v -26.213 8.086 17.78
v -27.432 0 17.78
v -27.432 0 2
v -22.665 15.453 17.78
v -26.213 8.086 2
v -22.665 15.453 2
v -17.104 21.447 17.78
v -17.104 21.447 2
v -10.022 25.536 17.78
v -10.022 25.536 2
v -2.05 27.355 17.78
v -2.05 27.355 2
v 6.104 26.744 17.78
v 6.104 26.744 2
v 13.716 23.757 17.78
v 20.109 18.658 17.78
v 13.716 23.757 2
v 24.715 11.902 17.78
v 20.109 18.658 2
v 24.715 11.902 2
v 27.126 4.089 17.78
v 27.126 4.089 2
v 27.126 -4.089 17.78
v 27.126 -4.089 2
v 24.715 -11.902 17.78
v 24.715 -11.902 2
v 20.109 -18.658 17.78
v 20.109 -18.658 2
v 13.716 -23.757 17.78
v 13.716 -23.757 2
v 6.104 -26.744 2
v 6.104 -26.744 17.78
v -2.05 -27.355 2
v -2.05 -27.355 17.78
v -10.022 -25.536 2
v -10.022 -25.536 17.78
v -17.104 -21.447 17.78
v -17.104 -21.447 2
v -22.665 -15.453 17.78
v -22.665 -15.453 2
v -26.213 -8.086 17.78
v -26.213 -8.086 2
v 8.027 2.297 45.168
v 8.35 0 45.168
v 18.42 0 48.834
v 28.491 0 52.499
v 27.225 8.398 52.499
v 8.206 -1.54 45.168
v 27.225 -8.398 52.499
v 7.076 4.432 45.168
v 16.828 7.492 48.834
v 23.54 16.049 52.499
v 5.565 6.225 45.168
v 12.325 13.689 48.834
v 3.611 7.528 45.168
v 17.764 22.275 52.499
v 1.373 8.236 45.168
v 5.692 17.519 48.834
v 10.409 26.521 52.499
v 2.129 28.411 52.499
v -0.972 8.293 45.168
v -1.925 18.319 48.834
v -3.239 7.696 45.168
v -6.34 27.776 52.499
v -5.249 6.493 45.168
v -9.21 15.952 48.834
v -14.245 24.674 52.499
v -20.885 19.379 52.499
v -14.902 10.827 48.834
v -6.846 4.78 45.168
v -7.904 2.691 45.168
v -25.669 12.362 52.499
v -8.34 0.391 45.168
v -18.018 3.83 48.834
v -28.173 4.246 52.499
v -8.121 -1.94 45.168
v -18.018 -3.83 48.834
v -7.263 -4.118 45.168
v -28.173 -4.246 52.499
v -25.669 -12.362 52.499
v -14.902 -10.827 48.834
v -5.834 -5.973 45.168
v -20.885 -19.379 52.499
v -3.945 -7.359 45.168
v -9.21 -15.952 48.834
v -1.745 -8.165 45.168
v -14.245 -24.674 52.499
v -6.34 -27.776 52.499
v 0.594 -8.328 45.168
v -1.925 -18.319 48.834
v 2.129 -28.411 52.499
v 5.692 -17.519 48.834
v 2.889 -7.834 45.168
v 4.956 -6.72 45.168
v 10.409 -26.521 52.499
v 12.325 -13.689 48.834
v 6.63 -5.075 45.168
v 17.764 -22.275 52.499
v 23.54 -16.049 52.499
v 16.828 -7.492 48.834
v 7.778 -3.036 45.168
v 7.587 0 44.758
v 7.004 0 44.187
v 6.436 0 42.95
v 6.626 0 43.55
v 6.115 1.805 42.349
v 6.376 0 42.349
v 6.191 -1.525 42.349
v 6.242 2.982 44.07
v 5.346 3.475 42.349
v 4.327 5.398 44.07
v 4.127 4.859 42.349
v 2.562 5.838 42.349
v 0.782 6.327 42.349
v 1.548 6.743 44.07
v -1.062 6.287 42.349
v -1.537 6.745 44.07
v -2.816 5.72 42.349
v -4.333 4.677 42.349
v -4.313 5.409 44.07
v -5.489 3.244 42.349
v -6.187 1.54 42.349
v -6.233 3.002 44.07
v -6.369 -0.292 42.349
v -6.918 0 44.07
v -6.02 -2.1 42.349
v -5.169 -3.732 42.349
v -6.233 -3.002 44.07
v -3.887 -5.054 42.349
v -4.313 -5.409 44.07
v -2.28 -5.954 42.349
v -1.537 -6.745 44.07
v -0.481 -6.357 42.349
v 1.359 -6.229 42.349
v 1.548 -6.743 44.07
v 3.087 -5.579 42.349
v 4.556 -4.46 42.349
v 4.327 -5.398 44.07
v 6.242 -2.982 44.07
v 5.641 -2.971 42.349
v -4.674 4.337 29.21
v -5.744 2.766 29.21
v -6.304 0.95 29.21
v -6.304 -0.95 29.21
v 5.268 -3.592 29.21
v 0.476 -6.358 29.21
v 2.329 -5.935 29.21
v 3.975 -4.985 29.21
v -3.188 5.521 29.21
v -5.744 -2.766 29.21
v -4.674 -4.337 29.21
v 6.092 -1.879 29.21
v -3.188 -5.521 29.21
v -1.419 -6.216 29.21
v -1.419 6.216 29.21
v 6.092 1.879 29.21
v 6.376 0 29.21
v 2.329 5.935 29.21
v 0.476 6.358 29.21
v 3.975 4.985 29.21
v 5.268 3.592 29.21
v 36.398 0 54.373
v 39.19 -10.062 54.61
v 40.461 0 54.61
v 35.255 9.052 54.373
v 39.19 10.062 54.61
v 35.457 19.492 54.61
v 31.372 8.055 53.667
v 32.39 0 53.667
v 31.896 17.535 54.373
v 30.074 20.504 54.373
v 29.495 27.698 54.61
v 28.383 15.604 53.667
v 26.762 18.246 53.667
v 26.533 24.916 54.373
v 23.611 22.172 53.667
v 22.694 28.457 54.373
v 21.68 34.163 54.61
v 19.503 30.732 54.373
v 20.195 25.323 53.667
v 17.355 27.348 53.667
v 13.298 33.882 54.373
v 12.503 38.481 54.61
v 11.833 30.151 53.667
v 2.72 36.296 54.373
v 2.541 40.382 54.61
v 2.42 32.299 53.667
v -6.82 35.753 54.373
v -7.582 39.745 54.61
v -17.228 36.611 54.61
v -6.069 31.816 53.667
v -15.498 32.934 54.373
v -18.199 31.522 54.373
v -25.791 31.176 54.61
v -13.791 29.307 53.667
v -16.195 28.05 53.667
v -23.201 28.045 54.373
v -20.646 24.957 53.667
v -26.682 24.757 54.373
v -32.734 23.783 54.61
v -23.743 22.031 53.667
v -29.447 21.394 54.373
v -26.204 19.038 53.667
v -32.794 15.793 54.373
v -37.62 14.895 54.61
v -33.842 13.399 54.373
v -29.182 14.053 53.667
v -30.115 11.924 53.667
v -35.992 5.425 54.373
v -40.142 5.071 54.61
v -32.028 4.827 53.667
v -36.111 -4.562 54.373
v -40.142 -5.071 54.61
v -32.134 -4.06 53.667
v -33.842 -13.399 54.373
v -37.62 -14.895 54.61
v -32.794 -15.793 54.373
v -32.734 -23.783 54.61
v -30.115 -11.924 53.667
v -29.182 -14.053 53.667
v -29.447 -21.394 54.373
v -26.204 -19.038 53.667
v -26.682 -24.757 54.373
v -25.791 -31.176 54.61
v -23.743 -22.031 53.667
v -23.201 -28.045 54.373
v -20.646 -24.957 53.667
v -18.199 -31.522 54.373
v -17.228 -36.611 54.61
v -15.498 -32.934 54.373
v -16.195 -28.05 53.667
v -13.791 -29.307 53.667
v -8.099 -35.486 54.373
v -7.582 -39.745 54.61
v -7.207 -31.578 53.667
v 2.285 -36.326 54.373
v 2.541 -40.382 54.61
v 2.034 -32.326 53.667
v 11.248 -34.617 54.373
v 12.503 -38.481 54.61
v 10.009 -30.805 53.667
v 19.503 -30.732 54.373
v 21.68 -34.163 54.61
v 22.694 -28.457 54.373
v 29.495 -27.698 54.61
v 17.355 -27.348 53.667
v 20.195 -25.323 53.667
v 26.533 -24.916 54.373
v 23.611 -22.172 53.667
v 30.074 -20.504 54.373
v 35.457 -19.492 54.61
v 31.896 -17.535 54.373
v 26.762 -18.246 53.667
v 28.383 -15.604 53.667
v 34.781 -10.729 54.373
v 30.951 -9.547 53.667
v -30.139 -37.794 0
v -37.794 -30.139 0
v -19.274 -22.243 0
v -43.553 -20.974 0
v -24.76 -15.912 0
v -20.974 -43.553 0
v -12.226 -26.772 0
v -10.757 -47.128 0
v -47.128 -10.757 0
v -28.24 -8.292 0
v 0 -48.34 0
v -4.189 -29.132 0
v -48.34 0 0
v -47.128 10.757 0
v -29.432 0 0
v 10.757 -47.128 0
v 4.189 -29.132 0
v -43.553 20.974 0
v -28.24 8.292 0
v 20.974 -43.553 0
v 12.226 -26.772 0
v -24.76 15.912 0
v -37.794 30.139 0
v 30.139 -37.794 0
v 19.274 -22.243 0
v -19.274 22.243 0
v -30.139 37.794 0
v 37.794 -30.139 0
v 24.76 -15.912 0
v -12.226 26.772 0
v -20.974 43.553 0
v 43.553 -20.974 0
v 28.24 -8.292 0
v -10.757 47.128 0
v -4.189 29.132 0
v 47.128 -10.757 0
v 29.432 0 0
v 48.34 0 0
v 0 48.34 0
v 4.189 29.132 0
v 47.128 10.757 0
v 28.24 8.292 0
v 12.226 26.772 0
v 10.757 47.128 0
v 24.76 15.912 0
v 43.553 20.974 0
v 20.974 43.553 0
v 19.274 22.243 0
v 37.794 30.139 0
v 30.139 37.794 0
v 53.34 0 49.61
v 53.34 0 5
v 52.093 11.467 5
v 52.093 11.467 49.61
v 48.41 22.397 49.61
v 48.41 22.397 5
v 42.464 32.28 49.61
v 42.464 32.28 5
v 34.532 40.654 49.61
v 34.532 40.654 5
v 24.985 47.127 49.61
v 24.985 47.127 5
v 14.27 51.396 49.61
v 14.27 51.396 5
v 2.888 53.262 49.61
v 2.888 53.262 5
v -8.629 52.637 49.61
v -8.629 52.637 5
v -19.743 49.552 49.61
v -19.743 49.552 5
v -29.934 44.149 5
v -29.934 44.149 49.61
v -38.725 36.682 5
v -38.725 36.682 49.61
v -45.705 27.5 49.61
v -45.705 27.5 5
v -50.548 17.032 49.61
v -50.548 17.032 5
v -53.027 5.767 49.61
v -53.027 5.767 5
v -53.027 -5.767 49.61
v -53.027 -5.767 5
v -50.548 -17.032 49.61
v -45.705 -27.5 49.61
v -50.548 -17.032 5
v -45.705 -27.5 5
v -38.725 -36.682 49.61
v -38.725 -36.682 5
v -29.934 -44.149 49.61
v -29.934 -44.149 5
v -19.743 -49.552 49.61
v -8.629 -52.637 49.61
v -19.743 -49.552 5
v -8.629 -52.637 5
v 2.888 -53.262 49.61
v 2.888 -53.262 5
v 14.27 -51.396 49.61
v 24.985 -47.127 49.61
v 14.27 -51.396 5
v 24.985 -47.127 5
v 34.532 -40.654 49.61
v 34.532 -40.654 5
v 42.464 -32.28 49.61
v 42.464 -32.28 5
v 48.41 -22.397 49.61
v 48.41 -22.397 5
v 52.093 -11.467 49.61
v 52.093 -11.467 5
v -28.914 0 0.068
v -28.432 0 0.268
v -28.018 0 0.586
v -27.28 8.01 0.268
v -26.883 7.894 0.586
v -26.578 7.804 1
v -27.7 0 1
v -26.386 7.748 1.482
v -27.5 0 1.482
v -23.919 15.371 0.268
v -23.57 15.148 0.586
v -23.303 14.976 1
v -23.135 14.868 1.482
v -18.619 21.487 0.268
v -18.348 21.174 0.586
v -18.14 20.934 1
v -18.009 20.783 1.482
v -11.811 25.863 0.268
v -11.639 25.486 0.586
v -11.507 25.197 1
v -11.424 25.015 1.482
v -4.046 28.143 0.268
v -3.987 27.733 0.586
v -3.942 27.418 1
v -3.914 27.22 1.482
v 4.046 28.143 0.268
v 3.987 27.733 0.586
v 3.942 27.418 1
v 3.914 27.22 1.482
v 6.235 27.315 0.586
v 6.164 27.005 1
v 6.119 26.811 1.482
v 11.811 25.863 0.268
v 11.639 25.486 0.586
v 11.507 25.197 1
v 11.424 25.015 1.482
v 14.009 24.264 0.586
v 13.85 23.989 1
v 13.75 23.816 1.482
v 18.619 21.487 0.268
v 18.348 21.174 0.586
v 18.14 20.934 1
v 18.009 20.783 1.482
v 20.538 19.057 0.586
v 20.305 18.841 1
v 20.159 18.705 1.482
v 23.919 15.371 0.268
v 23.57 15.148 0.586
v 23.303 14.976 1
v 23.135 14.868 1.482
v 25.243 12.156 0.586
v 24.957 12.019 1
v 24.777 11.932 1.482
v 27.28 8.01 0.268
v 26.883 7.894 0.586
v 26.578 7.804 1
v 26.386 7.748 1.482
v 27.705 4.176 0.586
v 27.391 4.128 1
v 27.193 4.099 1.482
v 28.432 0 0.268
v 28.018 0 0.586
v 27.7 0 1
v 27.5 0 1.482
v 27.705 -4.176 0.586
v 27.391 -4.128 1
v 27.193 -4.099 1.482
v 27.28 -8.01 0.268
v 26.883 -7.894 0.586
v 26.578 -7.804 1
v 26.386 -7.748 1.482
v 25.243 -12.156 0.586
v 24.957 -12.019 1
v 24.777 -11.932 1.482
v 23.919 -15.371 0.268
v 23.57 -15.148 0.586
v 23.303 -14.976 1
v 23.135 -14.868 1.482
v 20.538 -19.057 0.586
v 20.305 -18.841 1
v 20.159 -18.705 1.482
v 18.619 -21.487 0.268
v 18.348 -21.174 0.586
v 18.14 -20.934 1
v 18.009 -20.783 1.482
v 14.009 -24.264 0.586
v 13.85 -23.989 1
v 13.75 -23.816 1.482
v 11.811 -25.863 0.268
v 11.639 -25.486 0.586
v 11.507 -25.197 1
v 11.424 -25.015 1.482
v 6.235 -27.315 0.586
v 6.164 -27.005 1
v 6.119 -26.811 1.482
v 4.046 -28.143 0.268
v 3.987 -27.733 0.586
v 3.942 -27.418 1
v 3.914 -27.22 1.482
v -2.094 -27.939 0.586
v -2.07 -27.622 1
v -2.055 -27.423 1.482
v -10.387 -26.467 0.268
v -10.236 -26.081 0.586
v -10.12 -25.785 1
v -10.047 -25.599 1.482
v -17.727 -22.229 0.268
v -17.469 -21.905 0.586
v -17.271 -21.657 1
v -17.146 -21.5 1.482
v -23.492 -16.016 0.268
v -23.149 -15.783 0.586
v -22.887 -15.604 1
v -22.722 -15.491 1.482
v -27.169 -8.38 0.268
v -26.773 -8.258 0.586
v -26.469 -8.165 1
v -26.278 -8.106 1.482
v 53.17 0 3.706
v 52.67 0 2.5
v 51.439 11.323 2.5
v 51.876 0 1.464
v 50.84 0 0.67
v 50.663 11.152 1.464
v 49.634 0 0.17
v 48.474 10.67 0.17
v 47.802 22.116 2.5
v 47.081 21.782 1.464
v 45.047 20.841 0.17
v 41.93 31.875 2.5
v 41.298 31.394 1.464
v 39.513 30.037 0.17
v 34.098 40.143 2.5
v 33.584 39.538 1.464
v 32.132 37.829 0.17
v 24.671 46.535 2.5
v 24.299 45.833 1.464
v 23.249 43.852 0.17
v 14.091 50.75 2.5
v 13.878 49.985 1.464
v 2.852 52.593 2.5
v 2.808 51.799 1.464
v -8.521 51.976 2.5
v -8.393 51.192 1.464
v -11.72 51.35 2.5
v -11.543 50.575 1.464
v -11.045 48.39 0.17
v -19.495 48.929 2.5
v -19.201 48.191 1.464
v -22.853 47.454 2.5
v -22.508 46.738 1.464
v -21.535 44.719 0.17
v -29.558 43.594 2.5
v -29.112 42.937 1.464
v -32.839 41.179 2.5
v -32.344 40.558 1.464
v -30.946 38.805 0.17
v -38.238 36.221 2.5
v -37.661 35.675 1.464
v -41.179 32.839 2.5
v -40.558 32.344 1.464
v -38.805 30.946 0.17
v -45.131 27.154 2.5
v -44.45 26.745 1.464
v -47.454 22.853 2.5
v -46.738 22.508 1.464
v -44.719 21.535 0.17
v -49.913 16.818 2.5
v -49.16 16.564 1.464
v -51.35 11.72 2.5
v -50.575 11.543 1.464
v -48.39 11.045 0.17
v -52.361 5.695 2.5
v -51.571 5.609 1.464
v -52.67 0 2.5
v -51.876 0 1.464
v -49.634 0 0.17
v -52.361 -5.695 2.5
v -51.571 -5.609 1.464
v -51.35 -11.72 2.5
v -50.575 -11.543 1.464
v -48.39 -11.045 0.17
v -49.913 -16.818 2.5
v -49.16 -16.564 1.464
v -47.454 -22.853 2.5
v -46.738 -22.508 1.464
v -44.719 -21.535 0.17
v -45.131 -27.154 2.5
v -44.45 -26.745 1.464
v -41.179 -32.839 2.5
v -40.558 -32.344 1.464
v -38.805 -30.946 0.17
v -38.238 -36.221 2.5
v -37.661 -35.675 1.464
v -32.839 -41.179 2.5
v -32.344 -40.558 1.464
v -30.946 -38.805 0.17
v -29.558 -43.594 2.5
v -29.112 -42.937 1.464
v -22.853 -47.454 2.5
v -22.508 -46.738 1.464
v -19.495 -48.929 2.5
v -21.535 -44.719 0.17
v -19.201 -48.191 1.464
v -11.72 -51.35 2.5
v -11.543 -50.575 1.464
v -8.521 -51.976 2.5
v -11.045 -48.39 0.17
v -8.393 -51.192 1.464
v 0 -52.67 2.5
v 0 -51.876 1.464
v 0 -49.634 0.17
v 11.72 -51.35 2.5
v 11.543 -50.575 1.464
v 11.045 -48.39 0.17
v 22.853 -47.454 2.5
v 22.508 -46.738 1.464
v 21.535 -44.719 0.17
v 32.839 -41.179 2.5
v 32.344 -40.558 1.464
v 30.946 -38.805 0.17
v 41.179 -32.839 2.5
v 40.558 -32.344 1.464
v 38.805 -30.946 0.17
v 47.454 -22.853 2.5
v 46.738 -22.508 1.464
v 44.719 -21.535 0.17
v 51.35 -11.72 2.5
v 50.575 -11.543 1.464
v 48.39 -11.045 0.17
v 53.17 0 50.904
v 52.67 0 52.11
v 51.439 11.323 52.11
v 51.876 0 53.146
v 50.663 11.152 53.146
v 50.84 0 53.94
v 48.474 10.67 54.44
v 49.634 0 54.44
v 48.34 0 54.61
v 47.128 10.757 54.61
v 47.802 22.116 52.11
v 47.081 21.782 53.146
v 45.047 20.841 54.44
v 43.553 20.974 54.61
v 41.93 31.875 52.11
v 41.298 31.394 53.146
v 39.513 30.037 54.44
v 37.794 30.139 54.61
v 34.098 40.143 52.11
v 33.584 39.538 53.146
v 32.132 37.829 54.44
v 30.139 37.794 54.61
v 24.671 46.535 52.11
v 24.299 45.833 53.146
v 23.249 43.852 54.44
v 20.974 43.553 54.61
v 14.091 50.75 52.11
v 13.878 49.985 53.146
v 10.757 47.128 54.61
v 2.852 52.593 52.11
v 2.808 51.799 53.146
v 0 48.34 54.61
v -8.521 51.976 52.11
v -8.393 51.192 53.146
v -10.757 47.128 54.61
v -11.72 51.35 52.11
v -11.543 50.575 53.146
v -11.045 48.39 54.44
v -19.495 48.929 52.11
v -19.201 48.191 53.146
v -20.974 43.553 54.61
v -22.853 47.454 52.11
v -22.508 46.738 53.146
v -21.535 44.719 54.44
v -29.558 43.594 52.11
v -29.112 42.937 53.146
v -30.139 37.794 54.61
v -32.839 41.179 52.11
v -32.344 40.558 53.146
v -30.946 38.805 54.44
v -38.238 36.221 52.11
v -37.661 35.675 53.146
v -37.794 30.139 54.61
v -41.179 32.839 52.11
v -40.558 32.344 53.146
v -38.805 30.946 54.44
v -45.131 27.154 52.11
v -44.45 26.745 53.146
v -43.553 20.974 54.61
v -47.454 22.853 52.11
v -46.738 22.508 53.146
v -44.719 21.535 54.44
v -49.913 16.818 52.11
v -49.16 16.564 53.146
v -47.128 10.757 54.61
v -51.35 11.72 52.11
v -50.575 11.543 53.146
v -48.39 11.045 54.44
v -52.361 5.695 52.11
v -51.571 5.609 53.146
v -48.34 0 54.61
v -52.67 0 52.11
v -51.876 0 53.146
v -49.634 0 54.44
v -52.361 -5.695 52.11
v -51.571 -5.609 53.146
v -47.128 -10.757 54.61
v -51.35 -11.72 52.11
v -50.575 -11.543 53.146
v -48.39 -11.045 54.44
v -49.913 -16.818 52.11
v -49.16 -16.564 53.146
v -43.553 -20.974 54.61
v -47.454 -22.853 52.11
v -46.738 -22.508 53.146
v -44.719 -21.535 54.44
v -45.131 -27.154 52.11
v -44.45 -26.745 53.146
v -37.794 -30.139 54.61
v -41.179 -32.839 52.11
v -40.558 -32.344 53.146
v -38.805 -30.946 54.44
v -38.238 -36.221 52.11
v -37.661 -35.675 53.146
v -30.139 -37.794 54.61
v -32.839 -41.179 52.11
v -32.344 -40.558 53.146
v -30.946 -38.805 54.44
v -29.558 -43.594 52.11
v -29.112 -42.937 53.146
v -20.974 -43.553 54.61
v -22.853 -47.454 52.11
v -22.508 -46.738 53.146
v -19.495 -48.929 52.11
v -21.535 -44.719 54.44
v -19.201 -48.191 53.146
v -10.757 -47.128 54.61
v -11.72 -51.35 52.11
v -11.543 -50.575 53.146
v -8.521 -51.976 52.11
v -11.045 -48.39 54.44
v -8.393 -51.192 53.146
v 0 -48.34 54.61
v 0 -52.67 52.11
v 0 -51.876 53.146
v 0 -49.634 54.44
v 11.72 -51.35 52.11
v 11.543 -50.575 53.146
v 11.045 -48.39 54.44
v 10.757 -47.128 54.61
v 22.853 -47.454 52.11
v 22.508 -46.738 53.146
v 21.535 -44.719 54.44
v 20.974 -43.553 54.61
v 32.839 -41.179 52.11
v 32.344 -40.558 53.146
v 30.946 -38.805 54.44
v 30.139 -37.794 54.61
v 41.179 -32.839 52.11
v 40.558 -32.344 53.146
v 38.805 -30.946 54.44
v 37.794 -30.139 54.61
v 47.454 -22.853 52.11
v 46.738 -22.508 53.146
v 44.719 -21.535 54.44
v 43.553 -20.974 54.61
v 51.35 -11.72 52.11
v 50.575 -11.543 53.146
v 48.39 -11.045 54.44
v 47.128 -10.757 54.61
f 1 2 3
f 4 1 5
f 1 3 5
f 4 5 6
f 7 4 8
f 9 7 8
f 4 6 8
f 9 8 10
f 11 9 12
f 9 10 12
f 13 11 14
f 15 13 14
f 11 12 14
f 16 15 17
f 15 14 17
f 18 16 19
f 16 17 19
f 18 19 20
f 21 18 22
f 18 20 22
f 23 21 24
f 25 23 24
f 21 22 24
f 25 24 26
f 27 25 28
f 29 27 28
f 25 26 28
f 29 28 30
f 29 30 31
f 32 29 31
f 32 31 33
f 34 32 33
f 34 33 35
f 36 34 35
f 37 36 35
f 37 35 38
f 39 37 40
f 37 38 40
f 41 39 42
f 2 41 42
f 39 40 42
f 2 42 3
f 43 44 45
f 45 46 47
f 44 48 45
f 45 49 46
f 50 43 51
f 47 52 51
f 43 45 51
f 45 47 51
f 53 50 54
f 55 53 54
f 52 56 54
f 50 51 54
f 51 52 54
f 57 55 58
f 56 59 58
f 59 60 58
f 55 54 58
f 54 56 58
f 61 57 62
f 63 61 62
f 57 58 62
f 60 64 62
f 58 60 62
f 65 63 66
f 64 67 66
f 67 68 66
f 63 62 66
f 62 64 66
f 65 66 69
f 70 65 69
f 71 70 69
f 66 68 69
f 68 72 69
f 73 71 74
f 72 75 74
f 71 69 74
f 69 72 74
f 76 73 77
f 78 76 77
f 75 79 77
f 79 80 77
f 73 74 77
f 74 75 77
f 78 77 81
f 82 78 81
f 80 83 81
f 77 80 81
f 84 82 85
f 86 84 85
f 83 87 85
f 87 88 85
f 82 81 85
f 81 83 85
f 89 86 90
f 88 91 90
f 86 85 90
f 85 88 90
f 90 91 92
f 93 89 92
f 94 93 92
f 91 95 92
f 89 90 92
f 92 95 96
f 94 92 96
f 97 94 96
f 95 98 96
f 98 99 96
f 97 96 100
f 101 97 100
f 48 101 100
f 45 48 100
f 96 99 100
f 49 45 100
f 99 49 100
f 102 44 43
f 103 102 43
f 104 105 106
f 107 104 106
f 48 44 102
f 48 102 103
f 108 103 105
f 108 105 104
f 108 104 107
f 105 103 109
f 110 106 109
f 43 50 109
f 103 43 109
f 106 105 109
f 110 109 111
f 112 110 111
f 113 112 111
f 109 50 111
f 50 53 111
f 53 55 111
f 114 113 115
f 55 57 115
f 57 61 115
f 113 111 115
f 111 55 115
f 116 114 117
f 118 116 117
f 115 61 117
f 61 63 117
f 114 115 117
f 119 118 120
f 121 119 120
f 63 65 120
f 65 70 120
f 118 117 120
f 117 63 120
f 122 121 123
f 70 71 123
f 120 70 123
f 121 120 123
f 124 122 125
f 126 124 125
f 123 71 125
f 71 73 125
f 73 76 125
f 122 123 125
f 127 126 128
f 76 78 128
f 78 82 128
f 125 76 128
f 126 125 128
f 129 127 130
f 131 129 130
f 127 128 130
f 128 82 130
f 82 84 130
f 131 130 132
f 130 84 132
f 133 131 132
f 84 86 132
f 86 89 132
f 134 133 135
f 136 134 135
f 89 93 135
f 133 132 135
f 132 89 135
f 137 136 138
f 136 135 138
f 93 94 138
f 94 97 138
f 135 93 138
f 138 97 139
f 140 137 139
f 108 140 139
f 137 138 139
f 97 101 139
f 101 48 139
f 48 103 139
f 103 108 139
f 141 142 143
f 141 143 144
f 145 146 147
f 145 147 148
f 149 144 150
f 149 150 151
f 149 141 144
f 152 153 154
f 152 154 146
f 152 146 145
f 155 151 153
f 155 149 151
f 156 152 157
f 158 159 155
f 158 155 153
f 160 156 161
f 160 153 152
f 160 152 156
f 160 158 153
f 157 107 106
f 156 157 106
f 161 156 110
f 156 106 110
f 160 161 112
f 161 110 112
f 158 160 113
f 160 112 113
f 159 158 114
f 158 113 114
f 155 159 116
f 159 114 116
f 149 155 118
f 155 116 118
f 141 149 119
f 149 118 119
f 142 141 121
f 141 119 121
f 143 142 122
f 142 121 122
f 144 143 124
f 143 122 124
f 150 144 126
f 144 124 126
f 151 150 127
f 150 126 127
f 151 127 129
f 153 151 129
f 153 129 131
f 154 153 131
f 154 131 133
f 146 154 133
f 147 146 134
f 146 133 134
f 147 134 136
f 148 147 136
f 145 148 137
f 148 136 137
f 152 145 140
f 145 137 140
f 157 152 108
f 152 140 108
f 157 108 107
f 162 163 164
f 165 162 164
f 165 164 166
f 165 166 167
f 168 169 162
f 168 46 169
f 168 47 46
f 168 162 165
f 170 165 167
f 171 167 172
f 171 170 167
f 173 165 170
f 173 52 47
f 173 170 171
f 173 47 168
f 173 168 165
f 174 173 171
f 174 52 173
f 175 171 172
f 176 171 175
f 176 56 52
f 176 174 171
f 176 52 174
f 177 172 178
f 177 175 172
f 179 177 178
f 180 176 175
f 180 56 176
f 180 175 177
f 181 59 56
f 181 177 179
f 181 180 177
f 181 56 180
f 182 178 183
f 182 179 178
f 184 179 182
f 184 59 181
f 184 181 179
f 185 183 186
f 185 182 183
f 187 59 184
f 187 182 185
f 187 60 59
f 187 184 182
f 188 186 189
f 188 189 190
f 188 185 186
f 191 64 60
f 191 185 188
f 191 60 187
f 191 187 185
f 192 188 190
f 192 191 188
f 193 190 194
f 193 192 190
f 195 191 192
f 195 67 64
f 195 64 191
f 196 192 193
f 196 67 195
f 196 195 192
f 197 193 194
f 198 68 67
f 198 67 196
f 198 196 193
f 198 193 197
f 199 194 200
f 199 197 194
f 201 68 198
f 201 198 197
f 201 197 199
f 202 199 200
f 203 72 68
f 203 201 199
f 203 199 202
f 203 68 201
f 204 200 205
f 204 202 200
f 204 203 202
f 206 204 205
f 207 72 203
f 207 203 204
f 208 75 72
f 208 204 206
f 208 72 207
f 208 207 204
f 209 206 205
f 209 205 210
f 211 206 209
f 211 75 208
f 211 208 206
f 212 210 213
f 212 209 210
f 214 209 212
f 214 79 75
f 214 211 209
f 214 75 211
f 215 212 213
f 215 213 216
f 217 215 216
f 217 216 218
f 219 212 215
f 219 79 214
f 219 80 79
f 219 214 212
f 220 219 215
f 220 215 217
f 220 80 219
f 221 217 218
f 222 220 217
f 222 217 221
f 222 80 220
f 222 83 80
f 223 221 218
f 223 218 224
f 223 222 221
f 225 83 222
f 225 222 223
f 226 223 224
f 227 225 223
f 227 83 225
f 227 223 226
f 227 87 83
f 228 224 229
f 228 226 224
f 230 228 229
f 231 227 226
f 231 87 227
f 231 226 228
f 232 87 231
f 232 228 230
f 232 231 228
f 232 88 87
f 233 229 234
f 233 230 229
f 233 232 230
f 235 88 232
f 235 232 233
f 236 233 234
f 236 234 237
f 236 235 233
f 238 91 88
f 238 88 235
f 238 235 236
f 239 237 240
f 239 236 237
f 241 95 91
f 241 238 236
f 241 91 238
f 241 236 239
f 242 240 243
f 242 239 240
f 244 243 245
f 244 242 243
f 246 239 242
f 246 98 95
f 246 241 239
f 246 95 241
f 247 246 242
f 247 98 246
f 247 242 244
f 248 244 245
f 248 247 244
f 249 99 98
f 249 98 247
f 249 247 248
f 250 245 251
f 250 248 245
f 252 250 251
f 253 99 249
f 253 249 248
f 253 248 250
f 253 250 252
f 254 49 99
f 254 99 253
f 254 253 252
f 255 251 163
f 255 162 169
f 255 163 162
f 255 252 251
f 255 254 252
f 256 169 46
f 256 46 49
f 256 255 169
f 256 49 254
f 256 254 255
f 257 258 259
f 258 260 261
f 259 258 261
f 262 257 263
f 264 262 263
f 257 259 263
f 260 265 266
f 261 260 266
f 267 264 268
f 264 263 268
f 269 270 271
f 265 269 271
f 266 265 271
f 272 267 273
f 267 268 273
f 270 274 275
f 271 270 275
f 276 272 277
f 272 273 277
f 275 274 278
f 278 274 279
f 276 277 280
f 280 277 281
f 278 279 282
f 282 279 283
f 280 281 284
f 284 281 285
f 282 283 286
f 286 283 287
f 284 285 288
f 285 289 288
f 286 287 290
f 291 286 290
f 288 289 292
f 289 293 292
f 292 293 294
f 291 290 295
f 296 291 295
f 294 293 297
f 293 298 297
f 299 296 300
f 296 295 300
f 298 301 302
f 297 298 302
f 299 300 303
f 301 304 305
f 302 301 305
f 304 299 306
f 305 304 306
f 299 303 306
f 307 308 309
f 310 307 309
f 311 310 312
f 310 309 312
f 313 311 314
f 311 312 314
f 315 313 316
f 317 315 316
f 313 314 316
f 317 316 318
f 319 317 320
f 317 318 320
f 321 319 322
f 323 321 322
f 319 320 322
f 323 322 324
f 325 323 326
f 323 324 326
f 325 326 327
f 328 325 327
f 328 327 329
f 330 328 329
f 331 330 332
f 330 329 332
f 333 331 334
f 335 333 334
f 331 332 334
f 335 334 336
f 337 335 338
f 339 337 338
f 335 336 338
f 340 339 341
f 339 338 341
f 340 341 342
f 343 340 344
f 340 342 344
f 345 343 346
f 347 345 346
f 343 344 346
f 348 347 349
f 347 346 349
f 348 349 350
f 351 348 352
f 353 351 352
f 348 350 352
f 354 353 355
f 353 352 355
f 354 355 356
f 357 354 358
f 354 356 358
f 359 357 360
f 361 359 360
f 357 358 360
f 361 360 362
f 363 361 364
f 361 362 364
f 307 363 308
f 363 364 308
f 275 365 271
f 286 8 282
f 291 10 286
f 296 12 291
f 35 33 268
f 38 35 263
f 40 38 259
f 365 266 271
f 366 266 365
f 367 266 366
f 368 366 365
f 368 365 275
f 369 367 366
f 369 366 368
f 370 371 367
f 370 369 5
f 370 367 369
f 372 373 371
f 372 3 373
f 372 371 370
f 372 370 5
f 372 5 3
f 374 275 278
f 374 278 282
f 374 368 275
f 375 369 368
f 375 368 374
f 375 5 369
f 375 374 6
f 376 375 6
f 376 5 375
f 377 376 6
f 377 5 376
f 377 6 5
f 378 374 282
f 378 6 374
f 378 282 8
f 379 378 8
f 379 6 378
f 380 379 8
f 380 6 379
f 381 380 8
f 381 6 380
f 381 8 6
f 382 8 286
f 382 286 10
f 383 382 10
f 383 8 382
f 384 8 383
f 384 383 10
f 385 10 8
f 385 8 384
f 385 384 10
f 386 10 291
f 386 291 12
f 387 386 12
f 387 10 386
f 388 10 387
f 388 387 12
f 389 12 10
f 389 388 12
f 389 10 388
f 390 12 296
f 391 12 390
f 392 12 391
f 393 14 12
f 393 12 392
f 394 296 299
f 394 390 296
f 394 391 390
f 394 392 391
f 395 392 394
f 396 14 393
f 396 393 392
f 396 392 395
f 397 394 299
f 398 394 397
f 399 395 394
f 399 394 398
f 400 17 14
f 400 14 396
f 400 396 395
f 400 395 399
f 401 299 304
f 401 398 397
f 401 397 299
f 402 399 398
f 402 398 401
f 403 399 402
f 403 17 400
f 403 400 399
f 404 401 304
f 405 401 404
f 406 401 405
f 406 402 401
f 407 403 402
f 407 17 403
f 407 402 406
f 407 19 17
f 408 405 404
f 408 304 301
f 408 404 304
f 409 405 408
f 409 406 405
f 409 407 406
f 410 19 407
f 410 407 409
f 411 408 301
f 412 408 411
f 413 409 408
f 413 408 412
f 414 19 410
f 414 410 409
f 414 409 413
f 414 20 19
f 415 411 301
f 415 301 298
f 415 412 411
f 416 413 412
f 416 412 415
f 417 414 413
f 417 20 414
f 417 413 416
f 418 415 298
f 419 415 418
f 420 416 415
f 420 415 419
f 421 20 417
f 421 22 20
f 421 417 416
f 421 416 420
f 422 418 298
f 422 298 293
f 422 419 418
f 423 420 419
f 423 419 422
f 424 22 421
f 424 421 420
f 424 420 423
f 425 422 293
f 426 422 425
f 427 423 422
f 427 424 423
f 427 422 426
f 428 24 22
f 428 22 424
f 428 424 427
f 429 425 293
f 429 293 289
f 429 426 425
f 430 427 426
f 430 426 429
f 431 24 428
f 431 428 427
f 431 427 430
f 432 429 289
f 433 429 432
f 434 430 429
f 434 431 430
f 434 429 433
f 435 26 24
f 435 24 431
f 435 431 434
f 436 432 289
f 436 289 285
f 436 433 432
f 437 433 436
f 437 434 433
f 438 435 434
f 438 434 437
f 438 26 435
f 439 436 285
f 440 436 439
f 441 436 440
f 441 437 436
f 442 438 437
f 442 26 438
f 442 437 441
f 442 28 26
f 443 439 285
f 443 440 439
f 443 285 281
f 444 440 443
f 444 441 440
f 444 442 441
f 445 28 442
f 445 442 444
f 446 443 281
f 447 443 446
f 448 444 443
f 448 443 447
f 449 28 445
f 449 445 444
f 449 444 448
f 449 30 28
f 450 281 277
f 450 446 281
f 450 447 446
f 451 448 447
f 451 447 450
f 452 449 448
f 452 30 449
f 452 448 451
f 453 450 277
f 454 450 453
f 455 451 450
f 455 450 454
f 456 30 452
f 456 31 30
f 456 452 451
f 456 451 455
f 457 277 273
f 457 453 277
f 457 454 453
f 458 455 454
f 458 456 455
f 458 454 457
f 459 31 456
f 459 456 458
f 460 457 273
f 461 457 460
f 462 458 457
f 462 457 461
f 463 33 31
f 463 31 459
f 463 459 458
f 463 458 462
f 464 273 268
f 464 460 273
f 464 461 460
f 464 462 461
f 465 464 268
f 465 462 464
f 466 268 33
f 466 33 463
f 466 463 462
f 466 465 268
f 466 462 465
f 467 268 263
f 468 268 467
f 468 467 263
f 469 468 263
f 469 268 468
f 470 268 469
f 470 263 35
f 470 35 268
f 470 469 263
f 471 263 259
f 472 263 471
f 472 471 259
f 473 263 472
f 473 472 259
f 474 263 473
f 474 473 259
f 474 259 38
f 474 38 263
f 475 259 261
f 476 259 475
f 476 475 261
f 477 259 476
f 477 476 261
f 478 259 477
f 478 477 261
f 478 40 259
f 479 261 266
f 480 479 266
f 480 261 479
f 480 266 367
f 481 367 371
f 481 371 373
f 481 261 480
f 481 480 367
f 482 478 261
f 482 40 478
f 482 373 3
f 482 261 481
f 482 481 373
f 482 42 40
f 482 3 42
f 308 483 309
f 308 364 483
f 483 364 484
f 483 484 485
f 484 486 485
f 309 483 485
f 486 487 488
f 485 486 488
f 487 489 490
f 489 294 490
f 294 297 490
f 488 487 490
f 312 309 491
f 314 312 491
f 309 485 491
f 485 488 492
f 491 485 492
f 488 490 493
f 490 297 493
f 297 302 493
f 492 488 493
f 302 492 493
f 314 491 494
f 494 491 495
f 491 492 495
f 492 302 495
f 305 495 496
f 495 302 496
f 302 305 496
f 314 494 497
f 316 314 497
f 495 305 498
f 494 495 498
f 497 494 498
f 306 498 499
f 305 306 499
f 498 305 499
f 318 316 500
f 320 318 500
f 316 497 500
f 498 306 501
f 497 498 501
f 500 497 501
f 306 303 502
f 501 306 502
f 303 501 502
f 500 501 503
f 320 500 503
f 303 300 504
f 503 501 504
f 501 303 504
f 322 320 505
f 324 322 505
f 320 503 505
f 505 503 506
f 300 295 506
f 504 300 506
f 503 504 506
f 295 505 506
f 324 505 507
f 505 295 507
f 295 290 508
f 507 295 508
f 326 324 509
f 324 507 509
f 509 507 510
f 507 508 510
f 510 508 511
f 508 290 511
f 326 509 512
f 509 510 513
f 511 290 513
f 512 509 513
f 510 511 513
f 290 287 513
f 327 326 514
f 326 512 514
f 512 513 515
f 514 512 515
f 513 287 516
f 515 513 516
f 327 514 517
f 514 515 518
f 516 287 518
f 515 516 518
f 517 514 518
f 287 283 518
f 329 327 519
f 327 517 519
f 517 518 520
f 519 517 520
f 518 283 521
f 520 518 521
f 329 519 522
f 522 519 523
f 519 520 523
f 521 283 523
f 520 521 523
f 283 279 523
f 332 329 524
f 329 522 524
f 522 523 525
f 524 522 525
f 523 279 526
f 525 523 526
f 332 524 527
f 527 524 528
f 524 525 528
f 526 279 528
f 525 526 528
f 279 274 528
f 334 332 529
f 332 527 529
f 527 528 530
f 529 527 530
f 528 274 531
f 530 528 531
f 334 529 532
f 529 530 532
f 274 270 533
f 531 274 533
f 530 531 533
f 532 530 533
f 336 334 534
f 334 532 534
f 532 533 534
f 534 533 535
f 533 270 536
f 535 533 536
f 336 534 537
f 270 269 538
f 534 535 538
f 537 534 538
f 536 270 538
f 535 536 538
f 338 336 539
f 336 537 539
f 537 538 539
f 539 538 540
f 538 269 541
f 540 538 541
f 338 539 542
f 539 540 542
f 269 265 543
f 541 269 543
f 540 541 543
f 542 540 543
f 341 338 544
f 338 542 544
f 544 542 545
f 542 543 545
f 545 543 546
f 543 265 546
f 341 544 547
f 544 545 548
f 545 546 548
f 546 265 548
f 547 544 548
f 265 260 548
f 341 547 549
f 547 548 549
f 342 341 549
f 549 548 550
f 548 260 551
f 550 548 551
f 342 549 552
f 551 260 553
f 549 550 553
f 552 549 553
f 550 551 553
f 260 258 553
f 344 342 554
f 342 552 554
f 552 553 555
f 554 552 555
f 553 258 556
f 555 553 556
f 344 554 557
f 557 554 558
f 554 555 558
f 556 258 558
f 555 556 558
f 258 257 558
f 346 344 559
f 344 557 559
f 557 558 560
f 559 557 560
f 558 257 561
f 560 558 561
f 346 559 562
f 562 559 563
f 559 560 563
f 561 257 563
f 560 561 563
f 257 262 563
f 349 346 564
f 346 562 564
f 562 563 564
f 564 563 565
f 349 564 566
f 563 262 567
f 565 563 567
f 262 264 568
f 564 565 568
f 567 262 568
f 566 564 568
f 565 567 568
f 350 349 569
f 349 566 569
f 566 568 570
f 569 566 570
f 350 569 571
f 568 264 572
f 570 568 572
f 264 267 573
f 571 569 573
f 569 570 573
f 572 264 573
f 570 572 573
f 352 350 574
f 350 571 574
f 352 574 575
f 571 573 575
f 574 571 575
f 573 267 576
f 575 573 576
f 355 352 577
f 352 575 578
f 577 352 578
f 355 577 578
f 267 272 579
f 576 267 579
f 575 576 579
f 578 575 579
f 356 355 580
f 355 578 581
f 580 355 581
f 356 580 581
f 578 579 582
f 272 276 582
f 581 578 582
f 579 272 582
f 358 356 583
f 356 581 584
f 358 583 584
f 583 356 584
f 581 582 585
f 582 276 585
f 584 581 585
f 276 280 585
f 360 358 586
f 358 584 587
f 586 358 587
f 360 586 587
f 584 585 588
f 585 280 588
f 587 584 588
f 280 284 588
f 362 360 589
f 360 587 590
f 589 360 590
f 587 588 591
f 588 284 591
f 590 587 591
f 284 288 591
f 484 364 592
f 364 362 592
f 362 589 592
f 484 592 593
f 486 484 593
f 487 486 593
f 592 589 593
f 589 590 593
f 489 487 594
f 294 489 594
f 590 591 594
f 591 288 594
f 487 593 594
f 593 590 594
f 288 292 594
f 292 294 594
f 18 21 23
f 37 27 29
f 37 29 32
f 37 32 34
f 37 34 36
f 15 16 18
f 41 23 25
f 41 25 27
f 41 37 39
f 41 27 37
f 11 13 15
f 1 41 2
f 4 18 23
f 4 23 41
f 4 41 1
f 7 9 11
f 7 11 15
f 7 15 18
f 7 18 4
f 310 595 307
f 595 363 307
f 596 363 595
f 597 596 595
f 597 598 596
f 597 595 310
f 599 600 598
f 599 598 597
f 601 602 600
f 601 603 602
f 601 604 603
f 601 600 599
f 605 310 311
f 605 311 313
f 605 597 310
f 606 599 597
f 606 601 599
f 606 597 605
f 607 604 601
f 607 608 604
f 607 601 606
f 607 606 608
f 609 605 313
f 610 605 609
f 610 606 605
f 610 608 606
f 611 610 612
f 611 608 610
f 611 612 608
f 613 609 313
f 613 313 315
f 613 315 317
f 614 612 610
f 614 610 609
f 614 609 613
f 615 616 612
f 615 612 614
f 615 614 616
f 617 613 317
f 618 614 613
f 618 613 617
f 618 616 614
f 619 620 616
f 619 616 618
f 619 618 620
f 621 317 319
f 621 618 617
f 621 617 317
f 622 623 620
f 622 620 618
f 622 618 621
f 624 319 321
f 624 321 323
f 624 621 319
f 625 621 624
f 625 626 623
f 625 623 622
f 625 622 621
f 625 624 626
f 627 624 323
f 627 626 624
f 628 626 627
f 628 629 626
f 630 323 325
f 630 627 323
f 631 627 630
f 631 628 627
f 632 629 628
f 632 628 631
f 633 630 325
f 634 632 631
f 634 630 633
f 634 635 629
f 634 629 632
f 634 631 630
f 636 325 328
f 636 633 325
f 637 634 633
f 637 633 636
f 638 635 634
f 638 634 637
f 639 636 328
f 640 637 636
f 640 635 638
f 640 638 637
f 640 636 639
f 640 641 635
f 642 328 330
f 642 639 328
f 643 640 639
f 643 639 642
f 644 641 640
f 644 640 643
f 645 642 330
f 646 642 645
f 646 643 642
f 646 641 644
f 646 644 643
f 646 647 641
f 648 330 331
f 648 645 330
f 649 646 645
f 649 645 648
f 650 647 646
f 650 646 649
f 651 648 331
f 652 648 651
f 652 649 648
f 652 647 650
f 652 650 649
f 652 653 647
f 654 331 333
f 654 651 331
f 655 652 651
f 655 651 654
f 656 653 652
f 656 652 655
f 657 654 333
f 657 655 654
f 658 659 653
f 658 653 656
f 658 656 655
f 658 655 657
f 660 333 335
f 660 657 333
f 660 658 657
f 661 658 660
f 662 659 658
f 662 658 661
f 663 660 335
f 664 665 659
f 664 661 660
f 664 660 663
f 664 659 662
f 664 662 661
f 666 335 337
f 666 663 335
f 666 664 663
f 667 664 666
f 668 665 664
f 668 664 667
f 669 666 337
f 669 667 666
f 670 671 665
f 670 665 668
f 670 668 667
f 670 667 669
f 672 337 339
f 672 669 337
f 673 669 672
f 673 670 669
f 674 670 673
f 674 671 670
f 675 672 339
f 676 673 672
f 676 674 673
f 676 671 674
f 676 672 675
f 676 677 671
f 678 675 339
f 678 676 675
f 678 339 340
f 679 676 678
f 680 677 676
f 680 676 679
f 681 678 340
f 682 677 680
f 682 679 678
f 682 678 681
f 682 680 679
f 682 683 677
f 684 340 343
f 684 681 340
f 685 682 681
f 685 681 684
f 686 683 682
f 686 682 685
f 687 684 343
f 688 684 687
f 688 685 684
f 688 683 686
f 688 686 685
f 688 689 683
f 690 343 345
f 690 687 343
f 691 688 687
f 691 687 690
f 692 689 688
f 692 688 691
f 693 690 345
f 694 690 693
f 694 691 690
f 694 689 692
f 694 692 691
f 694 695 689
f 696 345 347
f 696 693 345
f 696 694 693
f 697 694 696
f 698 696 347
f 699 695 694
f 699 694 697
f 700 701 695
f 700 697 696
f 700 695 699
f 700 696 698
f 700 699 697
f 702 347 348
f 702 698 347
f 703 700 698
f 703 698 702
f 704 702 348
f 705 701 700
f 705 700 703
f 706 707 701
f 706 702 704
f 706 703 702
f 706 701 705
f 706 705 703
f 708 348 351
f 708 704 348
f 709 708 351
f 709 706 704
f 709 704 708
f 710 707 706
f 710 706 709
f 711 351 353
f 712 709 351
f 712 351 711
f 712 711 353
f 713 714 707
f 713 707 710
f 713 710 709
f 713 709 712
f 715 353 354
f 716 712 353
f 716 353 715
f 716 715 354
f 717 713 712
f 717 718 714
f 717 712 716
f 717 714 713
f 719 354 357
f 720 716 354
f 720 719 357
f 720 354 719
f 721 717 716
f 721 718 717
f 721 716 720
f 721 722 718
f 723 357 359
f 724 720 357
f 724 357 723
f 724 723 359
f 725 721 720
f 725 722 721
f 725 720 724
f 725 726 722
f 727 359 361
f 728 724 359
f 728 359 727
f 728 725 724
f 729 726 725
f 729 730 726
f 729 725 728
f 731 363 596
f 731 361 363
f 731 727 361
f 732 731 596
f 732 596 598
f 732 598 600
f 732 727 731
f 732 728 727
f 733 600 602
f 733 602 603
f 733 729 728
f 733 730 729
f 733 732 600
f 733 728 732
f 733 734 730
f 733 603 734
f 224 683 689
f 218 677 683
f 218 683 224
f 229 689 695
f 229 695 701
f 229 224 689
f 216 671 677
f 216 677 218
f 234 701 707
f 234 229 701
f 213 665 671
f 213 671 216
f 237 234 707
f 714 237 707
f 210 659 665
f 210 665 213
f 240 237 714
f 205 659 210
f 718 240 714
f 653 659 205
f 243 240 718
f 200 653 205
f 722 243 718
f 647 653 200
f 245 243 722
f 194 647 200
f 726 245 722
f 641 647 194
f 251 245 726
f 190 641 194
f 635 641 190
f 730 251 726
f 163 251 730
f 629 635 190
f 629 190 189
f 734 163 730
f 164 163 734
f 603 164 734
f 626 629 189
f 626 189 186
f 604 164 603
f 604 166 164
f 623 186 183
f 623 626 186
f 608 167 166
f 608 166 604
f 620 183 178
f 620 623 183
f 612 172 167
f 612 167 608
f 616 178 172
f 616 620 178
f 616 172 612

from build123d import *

# Parameters (mm, degrees)
SKETCH1_R          = 53.34
EXTRUDE1_DEPTH     = 54.61
FILLET1_R          = 5
SKETCH2_R          = 27.432
CUT_EXTRUDE1_DEPTH = 17.78
FILLET2_R          = 2
SKETCH3_R          = 34.29
CUT_EXTRUDE2_DEPTH = 10.16
CUT_EXTRUDE2_DRAFT = -70
FILLET3_R          = 35
SKETCH4_R          = 6.375629418
CUT_EXTRUDE3_DEPTH = 15.24
FILLET4_R          = 3


with BuildPart() as part:
    # Sketch1 → Extrude1 (new body)
    with BuildSketch(Plane.XY):
        Circle(SKETCH1_R)
    extrude(amount=EXTRUDE1_DEPTH)

    # Fillet1
    fillet1_edges = [part.edges().sort_by_distance(p)[0] for p in [
        (-53.34, 0, 0),
        (-53.34, 0, 54.61),
    ]]
    fillet(fillet1_edges, radius=FILLET1_R)

    # Sketch2 → Cut-Extrude1 (cut)
    with BuildSketch(Plane(origin=(0, 0, 0), x_dir=(-1, 0, 0), z_dir=(0, 0, -1))):
        Circle(SKETCH2_R)
    extrude(amount=-CUT_EXTRUDE1_DEPTH, mode=Mode.SUBTRACT)

    # Fillet2
    fillet2_edges = [part.edges().sort_by_distance(p)[0] for p in [
        (27.432, 0, 0),
    ]]
    fillet(fillet2_edges, radius=FILLET2_R)


with BuildPart() as cut_extrude2_tool:
    # Sketch3 → Cut-Extrude2 (with draft: the straight prism first)
    with BuildSketch(Plane.XY.offset(54.61)):
        Circle(SKETCH3_R)
    extrude(amount=-CUT_EXTRUDE2_DEPTH)
    # Cut-Extrude2: the draft: its side faces are tilted about the plane it starts from
    cut_extrude2_sides = [cut_extrude2_tool.faces().sort_by_distance(p)[0] for p in [
        (-34.29, 0, 49.53),
    ]]
    draft(cut_extrude2_sides, Plane.XY.offset(54.61), CUT_EXTRUDE2_DRAFT)


with BuildPart() as part_1:
    add(part.part)

    # Cut-Extrude2: cut by cut_extrude2_tool
    add(cut_extrude2_tool.part, mode=Mode.SUBTRACT)

    # Fillet3
    fillet3_edges = [part_1.edges().sort_by_distance(p)[0] for p in [
        (-34.29, 0, 54.61),
    ]]
    fillet(fillet3_edges, radius=FILLET3_R)

    # Sketch4 → Cut-Extrude3 (cut)
    with BuildSketch(Plane.XY.offset(44.45)):
        Circle(SKETCH4_R)
    extrude(amount=-CUT_EXTRUDE3_DEPTH, mode=Mode.SUBTRACT)

    # Fillet4
    fillet4_edges = [part_1.edges().sort_by_distance(p)[0] for p in [
        (-6.375629418, 0, 44.45),
    ]]
    fillet(fillet4_edges, radius=FILLET4_R)


solid = part_1.part
